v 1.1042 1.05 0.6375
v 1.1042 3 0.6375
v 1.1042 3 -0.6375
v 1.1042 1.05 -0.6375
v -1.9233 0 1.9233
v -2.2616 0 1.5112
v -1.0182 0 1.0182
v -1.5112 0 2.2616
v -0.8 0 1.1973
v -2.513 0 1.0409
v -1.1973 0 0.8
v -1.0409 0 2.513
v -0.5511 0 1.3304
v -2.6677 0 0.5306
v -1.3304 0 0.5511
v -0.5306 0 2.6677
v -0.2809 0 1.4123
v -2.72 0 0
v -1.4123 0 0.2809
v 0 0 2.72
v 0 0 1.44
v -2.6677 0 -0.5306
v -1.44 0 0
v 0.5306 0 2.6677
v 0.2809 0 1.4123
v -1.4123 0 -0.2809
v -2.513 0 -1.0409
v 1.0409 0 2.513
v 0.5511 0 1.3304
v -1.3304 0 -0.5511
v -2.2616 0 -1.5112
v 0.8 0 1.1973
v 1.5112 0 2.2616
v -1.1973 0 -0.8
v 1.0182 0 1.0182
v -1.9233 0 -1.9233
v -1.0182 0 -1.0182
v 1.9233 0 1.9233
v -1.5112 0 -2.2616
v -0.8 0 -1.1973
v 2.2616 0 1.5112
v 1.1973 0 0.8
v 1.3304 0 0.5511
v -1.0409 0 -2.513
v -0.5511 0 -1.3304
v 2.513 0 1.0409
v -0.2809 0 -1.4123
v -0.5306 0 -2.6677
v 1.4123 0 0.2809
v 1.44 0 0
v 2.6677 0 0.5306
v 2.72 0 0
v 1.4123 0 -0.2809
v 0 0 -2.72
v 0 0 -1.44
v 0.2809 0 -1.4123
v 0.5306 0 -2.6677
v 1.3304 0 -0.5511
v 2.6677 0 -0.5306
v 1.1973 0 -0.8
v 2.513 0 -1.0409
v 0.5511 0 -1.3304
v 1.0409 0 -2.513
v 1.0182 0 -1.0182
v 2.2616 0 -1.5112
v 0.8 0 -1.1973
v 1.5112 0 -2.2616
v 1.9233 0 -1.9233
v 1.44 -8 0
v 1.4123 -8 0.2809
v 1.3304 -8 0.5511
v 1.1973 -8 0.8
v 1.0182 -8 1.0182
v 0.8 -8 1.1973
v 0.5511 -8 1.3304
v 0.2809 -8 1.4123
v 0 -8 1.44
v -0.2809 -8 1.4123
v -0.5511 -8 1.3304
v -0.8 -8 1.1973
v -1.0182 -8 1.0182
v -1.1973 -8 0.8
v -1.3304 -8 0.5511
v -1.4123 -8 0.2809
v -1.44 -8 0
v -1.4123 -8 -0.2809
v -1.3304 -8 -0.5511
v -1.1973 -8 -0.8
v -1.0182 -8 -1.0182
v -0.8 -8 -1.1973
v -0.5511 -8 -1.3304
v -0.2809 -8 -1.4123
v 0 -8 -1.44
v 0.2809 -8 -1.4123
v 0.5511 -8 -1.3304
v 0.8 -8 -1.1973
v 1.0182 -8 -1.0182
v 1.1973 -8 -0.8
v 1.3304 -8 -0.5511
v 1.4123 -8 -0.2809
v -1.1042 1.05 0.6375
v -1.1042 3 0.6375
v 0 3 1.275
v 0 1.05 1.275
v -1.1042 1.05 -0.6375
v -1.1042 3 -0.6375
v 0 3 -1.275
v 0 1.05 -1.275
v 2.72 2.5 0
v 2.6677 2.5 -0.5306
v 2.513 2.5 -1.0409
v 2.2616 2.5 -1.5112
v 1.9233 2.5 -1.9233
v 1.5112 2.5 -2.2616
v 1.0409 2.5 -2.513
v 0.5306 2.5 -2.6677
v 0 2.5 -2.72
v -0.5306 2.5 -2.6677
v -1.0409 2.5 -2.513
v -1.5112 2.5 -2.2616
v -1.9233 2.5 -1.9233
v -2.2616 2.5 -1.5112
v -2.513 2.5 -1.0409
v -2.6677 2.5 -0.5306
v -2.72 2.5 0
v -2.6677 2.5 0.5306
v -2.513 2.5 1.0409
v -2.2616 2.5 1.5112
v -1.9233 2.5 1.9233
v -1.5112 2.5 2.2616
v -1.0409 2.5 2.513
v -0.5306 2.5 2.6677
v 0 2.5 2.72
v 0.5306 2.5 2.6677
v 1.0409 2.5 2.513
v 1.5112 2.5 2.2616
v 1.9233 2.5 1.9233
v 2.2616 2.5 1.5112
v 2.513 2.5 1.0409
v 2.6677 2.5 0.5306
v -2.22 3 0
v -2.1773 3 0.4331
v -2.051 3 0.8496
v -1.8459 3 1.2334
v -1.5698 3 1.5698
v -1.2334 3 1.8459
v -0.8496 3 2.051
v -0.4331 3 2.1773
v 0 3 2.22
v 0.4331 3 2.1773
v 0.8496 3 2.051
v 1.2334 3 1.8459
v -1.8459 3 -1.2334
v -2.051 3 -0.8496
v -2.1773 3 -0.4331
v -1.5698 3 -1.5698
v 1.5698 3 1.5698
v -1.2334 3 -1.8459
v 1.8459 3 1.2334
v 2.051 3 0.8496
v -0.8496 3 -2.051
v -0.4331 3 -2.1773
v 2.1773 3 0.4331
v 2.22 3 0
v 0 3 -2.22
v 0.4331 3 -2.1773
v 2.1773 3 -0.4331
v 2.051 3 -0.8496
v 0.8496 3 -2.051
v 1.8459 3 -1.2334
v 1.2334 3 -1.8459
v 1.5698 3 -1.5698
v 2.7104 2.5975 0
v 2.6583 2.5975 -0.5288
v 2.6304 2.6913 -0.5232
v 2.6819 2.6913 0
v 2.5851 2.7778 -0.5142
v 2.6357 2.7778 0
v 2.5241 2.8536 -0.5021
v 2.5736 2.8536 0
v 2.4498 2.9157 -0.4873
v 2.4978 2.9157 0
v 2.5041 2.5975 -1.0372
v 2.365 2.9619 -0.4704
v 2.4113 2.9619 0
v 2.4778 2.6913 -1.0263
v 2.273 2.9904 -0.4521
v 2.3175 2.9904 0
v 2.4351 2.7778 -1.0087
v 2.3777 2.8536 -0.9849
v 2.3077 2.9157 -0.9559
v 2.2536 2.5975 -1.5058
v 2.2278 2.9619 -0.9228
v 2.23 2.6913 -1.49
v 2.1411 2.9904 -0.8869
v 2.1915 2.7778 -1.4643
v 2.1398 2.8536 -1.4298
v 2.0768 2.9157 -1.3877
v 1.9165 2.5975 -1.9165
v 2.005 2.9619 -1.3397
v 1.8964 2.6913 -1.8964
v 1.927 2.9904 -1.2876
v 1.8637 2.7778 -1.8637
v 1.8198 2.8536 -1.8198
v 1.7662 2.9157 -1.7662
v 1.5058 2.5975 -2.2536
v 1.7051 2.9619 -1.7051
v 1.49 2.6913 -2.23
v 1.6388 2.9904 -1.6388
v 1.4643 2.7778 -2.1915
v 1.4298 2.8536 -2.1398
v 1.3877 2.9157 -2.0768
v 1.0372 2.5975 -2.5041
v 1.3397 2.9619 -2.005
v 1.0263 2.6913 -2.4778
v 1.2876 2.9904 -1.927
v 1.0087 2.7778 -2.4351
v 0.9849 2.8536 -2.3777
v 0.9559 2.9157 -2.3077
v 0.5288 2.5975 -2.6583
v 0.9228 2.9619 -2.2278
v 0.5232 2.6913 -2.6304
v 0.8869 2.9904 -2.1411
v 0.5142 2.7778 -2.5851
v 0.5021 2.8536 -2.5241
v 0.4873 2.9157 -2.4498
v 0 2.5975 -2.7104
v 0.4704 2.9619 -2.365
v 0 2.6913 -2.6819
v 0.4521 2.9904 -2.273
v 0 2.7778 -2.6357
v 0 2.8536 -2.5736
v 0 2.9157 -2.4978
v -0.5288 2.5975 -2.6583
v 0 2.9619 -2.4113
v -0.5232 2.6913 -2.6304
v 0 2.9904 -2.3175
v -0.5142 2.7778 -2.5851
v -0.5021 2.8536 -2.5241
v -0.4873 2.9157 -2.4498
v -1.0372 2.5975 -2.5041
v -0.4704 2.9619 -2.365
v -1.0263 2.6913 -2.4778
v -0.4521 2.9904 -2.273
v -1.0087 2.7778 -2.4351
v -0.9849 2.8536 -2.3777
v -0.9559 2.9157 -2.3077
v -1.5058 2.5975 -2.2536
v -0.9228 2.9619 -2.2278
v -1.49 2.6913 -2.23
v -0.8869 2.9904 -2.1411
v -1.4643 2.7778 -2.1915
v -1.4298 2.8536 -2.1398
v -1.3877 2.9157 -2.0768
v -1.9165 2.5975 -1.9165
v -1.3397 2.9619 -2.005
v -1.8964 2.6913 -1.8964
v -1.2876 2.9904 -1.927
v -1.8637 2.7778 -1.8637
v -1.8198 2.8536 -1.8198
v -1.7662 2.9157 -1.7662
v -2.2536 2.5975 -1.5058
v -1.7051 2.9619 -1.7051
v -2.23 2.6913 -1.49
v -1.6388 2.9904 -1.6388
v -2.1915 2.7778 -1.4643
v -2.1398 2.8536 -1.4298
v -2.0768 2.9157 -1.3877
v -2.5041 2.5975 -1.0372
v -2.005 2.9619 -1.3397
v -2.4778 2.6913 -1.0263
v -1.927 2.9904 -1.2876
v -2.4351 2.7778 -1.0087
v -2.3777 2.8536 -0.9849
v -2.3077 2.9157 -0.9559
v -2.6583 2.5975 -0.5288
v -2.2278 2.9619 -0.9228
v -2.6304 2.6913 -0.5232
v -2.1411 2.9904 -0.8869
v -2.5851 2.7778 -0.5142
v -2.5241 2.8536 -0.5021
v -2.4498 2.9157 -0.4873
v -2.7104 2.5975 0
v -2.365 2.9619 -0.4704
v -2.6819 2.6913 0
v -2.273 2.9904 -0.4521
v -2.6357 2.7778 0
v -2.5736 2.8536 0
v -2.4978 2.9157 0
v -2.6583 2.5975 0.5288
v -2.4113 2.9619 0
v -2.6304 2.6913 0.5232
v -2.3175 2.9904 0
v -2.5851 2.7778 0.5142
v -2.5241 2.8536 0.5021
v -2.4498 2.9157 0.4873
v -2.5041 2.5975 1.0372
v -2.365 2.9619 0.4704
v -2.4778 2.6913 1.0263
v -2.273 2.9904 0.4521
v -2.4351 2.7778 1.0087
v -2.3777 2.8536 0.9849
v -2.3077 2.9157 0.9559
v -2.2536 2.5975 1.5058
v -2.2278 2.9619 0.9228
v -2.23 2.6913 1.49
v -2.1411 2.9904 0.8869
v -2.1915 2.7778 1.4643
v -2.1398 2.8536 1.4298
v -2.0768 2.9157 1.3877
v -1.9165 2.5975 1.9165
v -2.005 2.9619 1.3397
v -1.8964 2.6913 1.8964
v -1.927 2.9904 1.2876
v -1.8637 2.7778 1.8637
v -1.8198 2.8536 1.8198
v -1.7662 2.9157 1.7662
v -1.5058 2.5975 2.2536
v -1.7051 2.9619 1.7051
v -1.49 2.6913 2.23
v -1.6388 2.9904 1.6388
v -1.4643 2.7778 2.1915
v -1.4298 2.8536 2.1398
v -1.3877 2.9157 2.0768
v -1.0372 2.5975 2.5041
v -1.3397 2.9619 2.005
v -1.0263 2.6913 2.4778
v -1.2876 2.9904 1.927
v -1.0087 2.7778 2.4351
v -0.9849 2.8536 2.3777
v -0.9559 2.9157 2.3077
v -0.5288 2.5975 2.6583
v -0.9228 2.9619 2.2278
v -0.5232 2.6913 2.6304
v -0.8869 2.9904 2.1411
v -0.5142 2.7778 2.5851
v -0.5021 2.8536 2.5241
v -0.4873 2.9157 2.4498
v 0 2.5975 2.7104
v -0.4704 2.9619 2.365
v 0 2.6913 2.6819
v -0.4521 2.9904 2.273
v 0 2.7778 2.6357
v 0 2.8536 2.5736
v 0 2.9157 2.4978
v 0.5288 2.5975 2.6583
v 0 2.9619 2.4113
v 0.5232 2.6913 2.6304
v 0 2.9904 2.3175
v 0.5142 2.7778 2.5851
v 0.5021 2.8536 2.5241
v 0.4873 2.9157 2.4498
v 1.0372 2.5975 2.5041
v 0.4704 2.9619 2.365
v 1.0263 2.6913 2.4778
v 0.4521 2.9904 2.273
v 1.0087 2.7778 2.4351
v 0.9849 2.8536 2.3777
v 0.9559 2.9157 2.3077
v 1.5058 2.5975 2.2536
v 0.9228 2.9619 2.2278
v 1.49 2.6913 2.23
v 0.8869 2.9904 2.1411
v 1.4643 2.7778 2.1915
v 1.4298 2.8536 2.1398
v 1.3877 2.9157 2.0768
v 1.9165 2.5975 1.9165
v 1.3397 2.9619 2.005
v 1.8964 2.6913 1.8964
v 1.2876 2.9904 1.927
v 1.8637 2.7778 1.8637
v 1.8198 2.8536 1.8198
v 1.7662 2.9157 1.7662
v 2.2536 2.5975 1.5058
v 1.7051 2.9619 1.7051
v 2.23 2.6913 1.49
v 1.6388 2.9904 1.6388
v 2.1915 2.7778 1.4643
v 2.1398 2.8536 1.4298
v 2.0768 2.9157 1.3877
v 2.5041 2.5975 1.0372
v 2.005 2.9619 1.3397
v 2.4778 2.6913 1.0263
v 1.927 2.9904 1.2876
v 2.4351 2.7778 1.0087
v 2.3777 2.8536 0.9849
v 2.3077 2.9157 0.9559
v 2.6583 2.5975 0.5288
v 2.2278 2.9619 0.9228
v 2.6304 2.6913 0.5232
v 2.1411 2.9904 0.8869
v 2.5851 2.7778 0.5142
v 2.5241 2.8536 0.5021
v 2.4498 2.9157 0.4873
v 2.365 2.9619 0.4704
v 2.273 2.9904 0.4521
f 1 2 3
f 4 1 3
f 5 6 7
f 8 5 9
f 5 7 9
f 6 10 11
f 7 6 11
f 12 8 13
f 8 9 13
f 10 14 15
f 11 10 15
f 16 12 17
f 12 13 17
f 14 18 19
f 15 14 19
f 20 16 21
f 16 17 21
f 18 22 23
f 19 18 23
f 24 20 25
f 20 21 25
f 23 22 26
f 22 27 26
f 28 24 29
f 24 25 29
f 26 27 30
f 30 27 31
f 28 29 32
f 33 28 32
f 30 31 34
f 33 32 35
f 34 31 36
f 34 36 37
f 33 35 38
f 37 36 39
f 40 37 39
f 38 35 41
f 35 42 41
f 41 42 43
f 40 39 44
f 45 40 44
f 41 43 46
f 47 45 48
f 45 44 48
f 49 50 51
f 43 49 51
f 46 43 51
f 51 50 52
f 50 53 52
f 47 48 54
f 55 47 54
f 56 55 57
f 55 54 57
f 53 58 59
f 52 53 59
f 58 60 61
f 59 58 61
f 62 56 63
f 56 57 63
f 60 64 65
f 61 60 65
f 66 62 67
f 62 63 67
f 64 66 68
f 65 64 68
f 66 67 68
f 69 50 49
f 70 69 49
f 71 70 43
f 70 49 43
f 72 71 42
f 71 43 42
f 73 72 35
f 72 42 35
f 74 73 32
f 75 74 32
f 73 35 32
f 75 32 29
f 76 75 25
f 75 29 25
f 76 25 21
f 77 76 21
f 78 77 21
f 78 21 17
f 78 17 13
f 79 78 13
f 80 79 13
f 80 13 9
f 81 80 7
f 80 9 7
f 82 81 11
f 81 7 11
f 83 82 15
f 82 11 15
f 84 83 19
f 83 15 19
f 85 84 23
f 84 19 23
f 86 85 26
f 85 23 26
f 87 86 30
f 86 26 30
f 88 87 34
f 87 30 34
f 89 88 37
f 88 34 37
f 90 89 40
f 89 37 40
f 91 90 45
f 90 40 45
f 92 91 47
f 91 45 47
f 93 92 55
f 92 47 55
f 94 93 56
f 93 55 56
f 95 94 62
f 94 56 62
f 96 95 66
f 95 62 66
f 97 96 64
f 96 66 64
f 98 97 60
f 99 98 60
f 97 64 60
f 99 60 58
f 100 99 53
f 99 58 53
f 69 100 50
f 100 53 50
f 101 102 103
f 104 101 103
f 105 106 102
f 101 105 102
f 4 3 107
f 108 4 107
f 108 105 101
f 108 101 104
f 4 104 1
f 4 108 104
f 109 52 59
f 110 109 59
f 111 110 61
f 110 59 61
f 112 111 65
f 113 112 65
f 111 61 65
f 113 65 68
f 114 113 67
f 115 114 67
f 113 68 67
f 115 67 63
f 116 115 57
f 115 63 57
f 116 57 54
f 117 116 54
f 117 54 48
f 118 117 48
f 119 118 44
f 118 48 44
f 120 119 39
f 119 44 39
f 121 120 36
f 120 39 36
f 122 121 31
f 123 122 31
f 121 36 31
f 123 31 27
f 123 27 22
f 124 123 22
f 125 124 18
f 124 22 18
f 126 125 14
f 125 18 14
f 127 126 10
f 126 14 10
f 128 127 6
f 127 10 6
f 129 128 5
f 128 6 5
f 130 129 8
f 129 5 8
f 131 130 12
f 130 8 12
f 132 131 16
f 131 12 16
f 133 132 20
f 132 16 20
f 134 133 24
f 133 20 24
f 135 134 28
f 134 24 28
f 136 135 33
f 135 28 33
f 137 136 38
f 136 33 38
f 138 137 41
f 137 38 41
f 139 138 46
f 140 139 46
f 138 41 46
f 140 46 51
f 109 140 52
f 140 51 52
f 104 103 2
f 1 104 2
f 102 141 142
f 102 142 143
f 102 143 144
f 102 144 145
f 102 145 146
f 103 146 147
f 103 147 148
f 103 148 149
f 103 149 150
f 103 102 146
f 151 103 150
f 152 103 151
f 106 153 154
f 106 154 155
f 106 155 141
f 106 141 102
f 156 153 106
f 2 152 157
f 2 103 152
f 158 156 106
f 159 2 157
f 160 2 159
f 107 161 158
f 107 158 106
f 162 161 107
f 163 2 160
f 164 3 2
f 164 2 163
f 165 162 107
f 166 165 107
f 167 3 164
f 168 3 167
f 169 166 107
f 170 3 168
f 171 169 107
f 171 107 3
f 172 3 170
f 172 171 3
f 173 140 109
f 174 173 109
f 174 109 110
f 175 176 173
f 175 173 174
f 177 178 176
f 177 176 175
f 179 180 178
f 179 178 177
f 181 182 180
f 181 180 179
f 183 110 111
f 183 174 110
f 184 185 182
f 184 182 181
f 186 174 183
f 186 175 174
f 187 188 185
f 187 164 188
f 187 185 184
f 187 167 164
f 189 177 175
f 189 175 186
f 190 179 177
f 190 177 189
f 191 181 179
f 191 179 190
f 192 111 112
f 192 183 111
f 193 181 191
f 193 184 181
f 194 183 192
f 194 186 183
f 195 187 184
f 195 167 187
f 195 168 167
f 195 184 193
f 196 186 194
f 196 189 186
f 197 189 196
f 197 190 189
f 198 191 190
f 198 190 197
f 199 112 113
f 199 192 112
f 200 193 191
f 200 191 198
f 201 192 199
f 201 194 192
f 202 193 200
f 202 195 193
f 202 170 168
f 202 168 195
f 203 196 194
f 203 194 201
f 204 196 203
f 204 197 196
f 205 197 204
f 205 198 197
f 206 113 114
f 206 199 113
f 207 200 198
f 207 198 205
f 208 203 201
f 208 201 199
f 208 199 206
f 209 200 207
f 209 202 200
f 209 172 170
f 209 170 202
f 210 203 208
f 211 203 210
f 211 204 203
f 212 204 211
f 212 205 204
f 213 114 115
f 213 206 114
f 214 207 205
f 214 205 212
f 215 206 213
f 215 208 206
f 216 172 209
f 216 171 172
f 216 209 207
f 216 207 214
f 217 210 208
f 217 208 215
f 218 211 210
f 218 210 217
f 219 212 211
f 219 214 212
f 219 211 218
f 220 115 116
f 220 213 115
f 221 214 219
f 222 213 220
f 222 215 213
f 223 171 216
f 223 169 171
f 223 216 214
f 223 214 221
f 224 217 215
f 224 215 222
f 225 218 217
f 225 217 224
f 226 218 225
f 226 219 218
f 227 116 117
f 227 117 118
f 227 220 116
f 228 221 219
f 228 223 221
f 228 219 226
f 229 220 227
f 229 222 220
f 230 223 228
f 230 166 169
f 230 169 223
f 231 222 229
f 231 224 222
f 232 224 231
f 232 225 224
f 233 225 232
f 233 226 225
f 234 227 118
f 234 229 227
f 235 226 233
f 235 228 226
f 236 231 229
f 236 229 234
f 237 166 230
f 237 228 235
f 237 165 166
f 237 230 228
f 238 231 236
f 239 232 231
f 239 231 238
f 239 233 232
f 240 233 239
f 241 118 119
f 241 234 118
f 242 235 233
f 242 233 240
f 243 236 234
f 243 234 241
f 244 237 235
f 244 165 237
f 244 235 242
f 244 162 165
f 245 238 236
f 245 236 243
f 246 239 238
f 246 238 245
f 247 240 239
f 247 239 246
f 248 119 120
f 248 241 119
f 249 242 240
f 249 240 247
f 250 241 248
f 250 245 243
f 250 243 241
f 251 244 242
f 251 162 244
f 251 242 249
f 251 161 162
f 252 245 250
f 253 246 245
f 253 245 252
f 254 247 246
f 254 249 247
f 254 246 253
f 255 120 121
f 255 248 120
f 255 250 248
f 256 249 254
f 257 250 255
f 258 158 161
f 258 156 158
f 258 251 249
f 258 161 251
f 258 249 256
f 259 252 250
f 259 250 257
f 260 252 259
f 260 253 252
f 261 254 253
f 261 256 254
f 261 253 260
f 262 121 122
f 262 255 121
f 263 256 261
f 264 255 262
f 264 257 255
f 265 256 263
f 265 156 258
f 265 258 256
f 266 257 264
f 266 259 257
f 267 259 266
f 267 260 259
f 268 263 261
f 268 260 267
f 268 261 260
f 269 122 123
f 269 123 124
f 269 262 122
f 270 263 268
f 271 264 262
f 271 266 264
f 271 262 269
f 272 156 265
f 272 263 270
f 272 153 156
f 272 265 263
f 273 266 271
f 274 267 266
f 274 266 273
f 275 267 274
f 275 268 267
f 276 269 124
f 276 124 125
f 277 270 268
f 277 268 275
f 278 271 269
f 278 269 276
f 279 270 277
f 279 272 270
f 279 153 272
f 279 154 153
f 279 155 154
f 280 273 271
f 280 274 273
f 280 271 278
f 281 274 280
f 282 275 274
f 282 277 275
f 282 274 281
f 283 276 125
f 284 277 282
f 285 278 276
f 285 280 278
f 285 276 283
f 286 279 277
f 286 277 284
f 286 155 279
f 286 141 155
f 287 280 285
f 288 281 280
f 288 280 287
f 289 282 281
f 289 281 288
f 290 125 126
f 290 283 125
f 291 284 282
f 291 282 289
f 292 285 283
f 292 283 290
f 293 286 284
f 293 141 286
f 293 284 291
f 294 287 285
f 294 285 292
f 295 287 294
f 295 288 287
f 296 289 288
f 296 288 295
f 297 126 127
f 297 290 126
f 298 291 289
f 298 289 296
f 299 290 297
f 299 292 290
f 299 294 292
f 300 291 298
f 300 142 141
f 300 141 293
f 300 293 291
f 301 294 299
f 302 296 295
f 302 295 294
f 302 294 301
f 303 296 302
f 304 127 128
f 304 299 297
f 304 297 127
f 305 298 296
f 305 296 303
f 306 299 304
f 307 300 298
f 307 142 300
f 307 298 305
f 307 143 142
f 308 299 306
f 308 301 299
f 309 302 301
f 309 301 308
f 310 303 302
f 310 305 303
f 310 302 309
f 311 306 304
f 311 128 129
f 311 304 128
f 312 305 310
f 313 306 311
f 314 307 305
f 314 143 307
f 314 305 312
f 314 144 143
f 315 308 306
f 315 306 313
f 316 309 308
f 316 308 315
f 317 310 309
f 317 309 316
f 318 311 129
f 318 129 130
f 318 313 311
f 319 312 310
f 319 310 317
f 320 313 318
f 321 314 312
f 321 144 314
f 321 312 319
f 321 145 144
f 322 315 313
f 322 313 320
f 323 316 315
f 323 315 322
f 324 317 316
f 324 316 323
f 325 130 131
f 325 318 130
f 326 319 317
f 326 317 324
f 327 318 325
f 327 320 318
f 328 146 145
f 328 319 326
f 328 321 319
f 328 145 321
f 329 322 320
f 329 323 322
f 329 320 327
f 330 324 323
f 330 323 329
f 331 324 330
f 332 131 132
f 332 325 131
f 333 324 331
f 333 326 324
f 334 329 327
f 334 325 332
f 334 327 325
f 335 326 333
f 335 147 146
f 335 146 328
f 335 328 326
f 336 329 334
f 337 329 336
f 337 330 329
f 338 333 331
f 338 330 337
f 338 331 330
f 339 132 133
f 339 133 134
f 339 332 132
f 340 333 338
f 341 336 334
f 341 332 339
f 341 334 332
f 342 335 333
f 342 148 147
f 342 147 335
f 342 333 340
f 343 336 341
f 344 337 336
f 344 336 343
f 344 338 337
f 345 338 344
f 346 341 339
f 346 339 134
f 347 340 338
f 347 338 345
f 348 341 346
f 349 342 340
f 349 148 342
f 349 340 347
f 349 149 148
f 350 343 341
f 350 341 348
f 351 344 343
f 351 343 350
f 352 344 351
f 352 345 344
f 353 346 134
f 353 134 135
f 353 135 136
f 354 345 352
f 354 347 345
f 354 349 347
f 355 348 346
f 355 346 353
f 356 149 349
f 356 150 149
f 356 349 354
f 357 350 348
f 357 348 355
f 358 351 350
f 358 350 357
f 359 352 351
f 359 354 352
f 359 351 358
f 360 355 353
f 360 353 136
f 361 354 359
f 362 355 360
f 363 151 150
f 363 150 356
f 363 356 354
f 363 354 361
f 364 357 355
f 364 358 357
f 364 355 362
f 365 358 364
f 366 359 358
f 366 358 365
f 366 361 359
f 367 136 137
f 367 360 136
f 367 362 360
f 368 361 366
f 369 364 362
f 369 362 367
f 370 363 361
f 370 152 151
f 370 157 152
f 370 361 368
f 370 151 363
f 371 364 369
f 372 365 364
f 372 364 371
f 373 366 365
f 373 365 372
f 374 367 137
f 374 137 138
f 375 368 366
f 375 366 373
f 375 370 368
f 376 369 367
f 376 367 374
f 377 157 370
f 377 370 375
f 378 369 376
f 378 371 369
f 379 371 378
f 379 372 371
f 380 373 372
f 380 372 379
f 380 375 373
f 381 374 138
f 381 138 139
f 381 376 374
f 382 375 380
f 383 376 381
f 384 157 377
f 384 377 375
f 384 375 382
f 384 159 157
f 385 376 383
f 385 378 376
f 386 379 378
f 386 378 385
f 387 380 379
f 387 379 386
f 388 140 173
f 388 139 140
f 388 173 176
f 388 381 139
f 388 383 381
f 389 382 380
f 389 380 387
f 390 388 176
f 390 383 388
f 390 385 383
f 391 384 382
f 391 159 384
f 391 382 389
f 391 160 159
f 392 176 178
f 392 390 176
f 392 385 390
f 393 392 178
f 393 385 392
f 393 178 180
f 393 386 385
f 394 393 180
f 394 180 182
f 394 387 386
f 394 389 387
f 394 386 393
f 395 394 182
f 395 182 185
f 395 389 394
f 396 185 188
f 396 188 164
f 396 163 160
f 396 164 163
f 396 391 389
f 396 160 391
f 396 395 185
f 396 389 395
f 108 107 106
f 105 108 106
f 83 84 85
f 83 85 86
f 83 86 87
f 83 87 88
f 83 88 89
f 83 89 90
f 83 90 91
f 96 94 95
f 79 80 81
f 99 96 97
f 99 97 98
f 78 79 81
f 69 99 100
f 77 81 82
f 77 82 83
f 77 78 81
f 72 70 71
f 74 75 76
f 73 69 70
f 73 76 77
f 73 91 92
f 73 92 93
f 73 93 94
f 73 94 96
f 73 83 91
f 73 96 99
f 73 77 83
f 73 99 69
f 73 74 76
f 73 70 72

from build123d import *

# Parameters (mm, degrees)
SKETCH1_R           = 2.72
BOSS_EXTRUDE1_DEPTH = 3
SKETCH2_R           = 1.44
BOSS_EXTRUDE2_DEPTH = 8
CUT_EXTRUDE1_DEPTH  = 1.95
FILLET1_R           = 0.5


with BuildPart() as part:
    # Sketch1 → Boss-Extrude1 (new body)
    with BuildSketch(Plane(origin=(0, 0, 0), x_dir=(1, 0, 0), z_dir=(0, 1, 0))):
        Circle(SKETCH1_R)
    extrude(amount=BOSS_EXTRUDE1_DEPTH)

    # Sketch2 → Boss-Extrude2 (add)
    with BuildSketch(Plane.XZ):
        Circle(SKETCH2_R)
    extrude(amount=BOSS_EXTRUDE2_DEPTH)

    # Sketch3 → Cut-Extrude1 (cut)
    with BuildSketch(Plane(origin=(0, 3, 0), x_dir=(1, 0, 0), z_dir=(0, 1, 0))):
        Polygon((1.10418239, 0.6375), (0, 1.275), (-1.10418239, 0.6375), (-1.10418239, -0.6375), (0, -1.275), (1.10418239, -0.6375), align=None)
    extrude(amount=-CUT_EXTRUDE1_DEPTH, mode=Mode.SUBTRACT)

    # Fillet1
    fillet1_edges = [part.edges().sort_by_distance(p)[0] for p in [
        (-2.72, 3, 0),
    ]]
    fillet(fillet1_edges, radius=FILLET1_R)


solid = part.part
